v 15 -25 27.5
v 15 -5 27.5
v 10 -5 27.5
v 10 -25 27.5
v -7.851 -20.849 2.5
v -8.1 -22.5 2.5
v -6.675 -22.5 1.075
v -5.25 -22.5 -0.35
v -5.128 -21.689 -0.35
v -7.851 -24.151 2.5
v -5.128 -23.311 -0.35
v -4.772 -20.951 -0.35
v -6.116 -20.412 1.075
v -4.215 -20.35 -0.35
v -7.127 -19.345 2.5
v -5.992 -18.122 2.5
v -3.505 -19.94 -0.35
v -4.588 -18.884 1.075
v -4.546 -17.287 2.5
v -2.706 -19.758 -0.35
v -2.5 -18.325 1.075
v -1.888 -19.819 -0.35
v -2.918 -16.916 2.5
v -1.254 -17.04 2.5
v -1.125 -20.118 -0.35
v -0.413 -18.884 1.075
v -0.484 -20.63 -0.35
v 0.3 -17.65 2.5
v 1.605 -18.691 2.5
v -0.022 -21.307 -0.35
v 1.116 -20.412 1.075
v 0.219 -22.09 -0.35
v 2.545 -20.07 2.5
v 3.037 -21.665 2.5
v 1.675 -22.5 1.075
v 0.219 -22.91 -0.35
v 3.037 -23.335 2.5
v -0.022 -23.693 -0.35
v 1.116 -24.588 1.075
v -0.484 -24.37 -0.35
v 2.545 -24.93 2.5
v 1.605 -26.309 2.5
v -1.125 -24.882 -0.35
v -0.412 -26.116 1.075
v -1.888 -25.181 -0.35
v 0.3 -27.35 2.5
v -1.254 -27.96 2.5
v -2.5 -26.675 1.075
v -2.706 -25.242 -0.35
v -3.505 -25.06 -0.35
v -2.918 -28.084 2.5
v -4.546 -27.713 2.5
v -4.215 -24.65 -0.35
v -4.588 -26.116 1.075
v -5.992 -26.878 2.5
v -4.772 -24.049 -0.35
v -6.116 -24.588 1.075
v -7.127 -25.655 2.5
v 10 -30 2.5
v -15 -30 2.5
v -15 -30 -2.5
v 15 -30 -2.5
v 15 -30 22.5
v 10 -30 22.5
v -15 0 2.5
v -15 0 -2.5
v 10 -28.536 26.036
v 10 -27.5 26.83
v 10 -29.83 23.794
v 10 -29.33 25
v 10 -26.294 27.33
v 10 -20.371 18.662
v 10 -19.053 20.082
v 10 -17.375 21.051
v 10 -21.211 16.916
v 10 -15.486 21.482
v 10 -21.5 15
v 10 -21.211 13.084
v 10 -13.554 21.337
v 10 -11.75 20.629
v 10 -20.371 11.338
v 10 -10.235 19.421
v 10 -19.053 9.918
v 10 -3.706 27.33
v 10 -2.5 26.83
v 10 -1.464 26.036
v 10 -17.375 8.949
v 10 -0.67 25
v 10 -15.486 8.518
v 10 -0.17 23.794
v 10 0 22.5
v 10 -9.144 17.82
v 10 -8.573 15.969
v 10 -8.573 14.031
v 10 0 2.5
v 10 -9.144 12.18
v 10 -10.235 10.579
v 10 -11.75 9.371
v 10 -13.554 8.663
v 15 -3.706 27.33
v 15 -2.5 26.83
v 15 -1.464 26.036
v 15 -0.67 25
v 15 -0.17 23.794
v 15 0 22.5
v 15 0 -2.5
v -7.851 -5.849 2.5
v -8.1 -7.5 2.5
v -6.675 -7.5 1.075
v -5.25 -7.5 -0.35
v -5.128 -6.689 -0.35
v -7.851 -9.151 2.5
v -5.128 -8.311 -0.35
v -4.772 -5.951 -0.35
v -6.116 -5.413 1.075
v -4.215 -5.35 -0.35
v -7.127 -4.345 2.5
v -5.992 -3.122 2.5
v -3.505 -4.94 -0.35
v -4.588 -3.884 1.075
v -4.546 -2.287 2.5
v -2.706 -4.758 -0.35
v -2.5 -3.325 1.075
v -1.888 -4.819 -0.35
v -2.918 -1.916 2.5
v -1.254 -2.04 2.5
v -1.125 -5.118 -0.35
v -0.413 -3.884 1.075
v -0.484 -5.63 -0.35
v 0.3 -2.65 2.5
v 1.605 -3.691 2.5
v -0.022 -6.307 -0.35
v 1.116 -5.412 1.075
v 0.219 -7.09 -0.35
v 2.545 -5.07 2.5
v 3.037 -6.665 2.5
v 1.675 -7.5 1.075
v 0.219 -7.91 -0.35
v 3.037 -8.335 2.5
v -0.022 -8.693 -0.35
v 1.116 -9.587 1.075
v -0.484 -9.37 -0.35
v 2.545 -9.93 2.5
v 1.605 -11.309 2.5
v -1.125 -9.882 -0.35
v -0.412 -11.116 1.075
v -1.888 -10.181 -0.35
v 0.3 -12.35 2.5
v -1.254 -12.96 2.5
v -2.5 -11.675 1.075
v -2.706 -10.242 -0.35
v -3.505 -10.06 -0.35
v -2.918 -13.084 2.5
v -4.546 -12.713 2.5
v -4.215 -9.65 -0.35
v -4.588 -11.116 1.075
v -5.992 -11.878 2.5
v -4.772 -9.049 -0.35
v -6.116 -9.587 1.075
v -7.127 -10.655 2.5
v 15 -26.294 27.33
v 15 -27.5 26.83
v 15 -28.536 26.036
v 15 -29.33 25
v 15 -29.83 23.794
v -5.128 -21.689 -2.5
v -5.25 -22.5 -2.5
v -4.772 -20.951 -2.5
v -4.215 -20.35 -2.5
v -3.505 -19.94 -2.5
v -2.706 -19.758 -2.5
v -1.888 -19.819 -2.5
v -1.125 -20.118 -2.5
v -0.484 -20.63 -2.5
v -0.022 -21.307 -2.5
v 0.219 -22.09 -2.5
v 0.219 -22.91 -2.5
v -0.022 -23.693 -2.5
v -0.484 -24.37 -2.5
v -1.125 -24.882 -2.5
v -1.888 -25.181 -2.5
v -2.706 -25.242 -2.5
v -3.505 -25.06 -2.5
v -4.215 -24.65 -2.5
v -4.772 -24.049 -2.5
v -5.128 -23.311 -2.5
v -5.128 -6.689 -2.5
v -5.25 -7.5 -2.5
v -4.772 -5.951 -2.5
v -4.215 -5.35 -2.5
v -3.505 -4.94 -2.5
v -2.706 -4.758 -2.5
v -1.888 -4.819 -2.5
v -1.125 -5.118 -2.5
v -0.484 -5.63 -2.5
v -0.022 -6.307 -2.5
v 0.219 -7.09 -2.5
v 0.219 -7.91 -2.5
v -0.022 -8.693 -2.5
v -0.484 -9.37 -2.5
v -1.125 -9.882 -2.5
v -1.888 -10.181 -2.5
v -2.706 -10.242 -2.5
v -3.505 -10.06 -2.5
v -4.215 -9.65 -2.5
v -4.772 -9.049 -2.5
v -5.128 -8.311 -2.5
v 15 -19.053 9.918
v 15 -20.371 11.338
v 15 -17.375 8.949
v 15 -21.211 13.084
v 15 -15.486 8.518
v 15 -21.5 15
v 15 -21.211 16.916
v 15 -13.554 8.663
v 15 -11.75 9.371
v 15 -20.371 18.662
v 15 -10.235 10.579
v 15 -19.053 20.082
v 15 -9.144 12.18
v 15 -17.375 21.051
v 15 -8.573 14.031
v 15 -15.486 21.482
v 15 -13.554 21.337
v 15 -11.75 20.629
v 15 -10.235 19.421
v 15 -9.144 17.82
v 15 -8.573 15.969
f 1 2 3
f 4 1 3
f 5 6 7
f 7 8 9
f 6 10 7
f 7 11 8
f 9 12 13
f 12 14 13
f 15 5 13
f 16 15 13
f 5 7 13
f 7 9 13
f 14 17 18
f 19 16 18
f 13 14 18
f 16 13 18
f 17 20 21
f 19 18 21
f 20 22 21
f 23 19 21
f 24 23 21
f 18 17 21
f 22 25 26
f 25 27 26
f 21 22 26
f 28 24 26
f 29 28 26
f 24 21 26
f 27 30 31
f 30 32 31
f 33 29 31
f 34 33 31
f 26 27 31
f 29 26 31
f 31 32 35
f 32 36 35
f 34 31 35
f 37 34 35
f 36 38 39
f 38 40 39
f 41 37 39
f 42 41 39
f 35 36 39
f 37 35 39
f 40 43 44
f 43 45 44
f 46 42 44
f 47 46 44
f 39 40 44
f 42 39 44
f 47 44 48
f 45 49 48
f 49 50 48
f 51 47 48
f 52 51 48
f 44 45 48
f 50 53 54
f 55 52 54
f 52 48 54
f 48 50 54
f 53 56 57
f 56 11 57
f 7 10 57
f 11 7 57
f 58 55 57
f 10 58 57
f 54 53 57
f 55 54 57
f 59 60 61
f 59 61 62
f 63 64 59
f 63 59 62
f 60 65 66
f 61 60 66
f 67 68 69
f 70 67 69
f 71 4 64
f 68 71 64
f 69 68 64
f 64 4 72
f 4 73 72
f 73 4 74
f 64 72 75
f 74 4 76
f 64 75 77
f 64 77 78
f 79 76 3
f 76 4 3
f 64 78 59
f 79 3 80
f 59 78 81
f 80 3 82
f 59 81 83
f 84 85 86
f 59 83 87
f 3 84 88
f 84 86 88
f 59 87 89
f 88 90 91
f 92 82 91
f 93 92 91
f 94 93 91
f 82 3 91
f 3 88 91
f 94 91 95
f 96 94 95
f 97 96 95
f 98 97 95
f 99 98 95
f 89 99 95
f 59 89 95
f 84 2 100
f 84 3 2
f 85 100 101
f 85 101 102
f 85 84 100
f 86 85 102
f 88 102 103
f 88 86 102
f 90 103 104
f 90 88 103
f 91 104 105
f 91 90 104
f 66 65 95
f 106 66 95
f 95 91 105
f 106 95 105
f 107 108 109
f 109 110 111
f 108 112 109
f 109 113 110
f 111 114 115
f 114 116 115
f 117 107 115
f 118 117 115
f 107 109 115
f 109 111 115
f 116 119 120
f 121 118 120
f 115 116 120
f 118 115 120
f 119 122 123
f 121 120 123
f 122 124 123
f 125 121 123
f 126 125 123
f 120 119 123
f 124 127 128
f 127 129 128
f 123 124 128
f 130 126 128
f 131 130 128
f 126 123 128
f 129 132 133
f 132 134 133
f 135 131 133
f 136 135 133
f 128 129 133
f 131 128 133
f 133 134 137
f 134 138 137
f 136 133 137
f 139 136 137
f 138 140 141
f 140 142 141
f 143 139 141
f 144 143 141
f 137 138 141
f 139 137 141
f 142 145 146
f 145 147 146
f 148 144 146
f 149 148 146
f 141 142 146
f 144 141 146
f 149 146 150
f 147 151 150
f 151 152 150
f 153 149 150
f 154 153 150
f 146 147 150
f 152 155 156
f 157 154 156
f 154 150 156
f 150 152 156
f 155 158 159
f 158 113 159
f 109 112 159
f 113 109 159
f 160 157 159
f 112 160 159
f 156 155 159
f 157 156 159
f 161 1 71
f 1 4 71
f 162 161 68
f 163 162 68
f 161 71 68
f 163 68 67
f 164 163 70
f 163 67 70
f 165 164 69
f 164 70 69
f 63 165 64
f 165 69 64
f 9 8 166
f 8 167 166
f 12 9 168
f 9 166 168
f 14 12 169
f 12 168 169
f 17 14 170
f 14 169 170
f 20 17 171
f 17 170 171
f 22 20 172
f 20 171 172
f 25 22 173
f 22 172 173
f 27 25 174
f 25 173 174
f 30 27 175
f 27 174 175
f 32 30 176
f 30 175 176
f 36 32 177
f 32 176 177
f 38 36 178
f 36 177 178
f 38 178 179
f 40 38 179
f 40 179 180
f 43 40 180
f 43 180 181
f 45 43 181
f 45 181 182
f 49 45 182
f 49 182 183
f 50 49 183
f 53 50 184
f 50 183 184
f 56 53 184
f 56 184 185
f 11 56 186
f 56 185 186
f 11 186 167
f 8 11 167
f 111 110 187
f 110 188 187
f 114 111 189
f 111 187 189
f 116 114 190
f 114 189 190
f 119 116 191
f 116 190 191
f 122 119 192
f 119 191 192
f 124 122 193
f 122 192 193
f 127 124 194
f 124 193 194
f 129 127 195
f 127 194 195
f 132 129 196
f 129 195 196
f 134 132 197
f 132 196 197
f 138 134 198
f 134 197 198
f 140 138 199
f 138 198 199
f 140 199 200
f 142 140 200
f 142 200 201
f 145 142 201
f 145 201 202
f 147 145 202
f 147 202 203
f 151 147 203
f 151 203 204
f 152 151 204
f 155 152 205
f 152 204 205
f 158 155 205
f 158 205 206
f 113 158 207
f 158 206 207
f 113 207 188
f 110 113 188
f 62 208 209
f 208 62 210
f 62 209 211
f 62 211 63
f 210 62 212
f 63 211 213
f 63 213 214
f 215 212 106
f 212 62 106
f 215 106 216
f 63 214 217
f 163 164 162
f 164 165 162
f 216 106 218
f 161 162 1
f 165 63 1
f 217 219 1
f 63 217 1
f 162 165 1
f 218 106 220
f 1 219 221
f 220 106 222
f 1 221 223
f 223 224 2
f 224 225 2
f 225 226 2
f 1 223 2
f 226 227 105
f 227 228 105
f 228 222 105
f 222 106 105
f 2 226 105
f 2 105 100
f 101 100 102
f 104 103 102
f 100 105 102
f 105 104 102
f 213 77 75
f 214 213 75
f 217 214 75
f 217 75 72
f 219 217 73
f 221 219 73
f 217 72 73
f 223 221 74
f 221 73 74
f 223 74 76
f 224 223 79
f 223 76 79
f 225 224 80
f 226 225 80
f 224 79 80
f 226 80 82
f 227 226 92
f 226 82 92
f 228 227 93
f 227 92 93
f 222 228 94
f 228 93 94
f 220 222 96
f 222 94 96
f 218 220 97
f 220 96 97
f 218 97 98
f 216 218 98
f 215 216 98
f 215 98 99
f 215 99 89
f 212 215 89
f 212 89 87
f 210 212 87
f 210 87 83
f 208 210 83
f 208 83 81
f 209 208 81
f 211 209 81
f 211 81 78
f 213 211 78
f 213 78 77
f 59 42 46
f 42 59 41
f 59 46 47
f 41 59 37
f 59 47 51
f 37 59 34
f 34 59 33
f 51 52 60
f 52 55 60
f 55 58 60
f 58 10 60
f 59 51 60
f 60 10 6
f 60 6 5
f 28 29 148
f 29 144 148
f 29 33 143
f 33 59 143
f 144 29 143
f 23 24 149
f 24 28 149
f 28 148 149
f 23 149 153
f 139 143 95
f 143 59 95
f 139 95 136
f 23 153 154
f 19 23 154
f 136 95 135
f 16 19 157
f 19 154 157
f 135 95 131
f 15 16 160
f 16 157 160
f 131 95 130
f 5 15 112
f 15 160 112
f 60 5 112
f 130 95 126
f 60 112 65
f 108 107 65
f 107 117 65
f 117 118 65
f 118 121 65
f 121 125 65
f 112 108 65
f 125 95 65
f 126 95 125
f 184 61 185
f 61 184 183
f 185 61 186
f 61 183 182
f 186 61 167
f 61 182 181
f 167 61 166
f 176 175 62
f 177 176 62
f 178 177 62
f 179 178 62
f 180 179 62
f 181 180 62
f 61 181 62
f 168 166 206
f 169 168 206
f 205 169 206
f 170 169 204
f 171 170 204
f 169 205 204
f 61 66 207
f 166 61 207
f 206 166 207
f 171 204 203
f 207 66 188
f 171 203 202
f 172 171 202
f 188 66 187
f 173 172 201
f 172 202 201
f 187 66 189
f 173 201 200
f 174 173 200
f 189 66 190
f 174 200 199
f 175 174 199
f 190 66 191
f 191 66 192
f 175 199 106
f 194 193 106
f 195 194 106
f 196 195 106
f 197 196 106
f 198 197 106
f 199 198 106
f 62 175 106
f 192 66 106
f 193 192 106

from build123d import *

# Parameters (mm, degrees)
F1_DEPTH       = 30
F2_R           = 5
F3_R           = 6.5
F4_DEPTH       = 5.001
F6_D           = 5.5
F6_DEPTH       = 18
F6_CSINK_D     = 11.2
F6_CSINK_ANGLE = 90
F6_TIP         = 1.6523667023


with BuildPart() as f1:
    # F0 (on Front) → F1 (new body)
    with BuildSketch(Plane.XZ):
        Polygon((-15, -2.5), (15, -2.5), (15, 2.5), (15, 27.5), (10, 27.5), (10, 2.5), (-15, 2.5), align=None)
    extrude(amount=F1_DEPTH)

    # F2
    f2_edges = [f1.edges().sort_by_distance(p)[0] for p in [
        (12.5, 0, 27.5),
        (12.5, -30, 27.5),
    ]]
    fillet(f2_edges, radius=F2_R)

    # F3 (on face) → F4 (cut, through all)
    with BuildSketch(Plane(origin=(10, 0, 0), x_dir=(0, -1, 0), z_dir=(-1, 0, 0))):
        with Locations((15, 15)):
            Circle(F3_R)
    extrude(amount=-F4_DEPTH, mode=Mode.SUBTRACT)

    # F6
    with Locations(Plane.XY.offset(2.5)):
        with Locations((-2.5, -22.5), (-2.5, -7.5)):
            CounterSinkHole(F6_D / 2, F6_CSINK_D / 2, depth=F6_DEPTH, counter_sink_angle=F6_CSINK_ANGLE)
            with Locations((0, 0, -(F6_DEPTH + F6_TIP / 2))):  # 118° drill point
                Cone(0, F6_D / 2, F6_TIP, mode=Mode.SUBTRACT)


solid = f1.part
